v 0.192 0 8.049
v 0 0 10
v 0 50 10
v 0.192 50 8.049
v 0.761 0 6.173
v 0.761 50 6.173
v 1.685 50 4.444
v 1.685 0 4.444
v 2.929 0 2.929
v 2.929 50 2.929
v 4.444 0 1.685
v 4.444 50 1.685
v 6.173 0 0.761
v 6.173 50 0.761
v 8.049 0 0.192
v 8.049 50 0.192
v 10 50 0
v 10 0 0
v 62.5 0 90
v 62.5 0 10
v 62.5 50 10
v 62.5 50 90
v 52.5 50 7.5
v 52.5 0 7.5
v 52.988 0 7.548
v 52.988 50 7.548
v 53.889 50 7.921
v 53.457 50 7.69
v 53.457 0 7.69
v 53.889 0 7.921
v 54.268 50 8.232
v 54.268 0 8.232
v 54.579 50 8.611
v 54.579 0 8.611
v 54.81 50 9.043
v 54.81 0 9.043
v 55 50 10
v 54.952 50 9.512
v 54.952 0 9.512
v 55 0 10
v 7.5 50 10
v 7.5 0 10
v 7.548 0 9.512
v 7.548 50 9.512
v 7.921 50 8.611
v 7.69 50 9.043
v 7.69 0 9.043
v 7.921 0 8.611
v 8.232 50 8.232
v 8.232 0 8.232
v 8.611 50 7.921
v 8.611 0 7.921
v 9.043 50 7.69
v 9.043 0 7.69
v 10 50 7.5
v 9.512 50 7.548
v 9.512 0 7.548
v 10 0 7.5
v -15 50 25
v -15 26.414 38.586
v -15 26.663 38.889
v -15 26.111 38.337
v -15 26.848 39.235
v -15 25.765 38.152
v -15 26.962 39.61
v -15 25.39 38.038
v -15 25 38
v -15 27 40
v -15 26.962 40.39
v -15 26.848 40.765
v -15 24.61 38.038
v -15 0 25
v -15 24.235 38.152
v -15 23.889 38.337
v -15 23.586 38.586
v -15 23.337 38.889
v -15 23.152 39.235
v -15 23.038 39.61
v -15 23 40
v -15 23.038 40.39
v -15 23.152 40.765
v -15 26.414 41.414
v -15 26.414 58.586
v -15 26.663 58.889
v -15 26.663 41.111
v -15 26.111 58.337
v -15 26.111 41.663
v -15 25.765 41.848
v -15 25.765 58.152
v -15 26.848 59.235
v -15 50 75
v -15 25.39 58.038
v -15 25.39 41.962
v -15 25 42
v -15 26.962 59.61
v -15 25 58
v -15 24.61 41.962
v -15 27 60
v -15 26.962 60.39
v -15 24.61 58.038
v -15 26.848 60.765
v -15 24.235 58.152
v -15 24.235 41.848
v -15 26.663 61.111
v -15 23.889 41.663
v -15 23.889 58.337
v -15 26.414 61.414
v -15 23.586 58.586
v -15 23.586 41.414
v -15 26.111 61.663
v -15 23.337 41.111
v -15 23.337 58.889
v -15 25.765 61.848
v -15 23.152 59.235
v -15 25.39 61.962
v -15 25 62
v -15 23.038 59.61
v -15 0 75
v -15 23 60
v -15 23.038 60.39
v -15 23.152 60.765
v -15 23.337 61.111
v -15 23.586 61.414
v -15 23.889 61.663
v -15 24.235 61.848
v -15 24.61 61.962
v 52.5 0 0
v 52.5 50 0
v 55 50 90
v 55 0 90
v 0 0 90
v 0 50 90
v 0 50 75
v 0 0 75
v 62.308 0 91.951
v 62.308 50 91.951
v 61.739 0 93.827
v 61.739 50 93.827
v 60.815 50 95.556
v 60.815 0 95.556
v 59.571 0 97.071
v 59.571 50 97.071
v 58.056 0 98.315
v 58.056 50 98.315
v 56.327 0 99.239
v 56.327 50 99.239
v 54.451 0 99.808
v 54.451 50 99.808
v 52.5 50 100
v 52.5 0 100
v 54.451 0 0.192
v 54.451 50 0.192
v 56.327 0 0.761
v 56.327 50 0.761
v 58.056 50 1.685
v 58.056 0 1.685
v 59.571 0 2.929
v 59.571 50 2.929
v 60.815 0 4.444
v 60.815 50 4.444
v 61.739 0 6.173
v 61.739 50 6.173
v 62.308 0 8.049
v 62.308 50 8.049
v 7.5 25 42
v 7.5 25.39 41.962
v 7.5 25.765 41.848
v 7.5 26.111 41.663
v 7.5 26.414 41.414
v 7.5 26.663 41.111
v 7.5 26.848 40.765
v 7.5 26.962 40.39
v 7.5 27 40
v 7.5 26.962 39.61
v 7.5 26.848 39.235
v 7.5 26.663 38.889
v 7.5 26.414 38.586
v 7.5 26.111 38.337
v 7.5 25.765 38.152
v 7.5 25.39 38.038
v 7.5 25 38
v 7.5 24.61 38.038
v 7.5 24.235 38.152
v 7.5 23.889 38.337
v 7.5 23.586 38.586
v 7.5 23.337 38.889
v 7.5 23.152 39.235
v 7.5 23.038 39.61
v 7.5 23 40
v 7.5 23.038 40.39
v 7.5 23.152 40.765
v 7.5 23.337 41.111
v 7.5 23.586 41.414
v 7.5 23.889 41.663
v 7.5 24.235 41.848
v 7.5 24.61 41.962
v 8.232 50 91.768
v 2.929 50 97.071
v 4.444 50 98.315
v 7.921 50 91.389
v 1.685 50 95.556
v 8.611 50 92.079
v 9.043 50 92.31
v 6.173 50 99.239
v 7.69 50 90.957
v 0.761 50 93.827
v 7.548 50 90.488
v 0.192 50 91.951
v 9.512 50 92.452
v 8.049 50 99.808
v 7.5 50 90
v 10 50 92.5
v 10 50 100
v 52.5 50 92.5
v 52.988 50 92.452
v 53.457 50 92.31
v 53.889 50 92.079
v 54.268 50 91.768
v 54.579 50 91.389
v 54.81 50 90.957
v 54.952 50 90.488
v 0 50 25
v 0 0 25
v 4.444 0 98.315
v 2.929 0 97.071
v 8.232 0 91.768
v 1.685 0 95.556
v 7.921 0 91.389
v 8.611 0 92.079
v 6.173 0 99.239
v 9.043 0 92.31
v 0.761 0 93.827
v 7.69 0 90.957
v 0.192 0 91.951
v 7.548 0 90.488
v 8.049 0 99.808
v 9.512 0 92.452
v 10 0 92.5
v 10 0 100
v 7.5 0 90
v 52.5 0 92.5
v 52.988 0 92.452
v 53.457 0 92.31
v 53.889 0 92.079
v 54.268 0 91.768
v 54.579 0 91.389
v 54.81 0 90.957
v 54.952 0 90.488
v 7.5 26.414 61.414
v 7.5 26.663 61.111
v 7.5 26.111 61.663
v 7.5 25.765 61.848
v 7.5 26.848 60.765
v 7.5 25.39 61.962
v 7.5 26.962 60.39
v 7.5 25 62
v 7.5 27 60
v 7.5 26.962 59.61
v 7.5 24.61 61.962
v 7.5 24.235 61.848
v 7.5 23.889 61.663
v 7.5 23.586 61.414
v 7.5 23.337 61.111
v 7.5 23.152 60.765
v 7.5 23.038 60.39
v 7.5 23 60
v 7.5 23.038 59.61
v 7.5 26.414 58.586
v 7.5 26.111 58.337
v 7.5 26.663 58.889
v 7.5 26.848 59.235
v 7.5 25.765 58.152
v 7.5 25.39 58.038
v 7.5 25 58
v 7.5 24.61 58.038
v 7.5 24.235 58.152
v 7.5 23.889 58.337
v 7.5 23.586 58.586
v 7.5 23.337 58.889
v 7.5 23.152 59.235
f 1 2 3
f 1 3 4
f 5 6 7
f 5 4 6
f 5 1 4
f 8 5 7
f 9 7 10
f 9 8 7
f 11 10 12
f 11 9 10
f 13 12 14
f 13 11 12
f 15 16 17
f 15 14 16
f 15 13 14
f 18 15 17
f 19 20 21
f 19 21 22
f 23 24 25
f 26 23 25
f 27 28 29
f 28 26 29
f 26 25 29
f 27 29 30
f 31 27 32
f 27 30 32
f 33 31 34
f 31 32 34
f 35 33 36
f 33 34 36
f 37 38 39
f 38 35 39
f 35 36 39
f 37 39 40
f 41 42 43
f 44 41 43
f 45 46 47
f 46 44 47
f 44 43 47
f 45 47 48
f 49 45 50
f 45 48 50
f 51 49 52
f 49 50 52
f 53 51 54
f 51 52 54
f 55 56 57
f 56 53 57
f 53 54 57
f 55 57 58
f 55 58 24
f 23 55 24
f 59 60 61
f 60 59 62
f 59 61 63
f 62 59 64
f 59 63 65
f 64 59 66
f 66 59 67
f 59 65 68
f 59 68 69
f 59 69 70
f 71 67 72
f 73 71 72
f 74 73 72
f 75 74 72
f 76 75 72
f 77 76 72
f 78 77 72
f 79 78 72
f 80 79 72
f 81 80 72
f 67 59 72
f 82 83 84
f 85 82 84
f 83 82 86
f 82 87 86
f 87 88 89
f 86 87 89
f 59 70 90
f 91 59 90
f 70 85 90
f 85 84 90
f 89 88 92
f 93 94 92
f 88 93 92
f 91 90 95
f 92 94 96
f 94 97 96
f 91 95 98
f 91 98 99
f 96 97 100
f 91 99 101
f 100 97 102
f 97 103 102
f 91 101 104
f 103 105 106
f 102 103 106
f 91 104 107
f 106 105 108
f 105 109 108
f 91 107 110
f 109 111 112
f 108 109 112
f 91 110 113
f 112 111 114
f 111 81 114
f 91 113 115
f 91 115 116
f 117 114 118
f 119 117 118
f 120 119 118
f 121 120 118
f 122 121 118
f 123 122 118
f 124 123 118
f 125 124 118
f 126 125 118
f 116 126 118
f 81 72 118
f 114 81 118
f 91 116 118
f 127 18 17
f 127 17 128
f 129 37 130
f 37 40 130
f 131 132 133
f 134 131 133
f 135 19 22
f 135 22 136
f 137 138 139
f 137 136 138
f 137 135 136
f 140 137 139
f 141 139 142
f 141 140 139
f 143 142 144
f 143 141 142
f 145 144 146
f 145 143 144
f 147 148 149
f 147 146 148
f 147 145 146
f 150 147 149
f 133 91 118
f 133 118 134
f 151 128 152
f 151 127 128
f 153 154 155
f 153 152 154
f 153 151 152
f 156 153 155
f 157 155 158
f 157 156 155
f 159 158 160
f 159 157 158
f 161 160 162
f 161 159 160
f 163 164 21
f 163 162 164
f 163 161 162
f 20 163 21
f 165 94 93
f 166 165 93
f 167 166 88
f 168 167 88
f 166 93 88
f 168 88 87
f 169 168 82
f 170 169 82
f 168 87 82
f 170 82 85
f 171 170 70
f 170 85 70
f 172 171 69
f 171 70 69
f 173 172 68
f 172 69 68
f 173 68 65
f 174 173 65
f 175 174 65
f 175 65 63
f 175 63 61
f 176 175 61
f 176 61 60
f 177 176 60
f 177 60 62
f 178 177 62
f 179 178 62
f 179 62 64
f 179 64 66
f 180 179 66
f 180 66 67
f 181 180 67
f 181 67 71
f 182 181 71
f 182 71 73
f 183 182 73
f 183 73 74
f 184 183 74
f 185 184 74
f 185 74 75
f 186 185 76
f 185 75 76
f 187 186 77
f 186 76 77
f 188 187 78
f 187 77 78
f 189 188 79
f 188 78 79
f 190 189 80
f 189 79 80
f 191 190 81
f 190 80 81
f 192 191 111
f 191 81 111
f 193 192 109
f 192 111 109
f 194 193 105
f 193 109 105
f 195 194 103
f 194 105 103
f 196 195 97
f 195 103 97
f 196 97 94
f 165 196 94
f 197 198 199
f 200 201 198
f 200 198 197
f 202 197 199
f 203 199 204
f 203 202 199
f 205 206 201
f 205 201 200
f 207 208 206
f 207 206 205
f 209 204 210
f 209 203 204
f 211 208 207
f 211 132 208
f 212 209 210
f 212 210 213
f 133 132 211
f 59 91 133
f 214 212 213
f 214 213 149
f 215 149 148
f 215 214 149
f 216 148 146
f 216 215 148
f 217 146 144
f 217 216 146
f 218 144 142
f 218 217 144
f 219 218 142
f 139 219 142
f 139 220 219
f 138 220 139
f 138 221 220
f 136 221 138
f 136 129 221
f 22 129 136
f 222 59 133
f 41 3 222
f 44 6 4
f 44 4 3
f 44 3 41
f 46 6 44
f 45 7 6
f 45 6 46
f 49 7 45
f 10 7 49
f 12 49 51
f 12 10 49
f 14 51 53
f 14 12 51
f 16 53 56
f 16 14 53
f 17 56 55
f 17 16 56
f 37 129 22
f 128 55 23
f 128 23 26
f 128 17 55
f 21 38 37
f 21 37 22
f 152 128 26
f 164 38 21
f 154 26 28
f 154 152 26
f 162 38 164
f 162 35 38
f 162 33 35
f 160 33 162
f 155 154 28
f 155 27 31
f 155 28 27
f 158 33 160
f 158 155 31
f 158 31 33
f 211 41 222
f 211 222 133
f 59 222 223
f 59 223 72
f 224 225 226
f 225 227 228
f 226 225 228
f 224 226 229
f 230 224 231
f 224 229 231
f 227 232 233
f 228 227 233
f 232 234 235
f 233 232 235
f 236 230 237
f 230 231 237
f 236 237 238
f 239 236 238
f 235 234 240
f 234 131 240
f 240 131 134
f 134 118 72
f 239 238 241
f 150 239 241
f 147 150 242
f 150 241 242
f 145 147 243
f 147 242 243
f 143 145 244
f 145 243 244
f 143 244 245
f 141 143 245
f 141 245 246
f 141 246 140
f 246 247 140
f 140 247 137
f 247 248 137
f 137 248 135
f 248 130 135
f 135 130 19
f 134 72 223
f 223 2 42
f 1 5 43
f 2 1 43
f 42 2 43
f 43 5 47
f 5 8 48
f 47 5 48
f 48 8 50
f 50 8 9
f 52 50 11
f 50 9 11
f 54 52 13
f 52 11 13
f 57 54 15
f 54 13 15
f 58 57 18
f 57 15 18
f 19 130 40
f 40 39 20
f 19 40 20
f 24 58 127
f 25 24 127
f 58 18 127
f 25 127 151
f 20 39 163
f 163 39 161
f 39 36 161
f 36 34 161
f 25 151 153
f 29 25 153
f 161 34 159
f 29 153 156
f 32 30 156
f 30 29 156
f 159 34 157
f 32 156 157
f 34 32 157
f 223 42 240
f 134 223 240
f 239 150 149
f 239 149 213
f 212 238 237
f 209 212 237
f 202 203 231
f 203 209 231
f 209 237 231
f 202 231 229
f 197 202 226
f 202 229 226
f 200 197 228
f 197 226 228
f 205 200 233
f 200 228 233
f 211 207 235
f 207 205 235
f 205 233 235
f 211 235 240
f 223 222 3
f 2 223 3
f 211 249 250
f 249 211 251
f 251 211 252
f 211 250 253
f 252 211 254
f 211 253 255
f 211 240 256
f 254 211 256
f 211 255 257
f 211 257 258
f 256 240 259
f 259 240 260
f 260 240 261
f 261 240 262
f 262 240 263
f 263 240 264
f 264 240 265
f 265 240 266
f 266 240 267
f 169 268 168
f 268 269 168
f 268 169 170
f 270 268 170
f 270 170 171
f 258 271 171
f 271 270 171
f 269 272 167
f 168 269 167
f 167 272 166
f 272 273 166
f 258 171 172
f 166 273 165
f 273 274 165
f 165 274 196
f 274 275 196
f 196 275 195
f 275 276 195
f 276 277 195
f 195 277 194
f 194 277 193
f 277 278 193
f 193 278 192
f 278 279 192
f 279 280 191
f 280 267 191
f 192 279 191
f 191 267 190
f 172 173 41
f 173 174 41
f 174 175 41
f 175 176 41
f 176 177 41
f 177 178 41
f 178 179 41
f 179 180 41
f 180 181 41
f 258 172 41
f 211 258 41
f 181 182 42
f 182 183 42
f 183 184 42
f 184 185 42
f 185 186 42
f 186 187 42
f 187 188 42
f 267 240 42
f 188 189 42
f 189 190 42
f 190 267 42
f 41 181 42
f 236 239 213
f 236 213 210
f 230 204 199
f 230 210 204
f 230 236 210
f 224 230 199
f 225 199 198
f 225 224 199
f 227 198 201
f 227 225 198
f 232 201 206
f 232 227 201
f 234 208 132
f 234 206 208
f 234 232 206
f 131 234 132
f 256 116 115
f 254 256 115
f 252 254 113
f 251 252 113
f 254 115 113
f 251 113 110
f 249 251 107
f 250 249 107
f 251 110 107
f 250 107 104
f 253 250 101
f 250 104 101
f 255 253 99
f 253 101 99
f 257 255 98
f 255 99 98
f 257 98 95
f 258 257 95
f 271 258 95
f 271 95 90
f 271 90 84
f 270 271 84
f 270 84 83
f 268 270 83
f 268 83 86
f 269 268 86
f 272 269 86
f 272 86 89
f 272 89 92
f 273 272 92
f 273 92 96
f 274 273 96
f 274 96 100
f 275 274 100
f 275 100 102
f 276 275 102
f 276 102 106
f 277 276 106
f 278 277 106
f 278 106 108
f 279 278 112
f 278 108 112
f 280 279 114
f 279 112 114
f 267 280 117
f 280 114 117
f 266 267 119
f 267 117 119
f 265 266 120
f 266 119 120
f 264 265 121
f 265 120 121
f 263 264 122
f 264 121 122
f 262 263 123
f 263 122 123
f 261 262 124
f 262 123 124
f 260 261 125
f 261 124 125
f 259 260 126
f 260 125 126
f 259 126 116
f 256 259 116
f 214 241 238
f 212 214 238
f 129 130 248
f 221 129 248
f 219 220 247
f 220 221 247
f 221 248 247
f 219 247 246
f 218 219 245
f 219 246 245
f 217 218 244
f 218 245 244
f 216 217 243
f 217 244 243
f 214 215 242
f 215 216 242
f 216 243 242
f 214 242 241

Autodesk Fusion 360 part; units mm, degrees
sketch "Sketch1" plane through (0, 0, 0) normal (1, 0, 0) x (0, 0, -1)
sketch "Sketch2" plane through (0, 0, 0) normal (0, 1, 0) x (1, 0, 0)
  line L0 (10, 0) -> (52.5, 0)
  line L1 (62.5, -10) -> (62.5, -90)
  line L2 (52.5, -100) -> (10, -100)
  line L3 (0, -25) -> (-15, -25)
  line L4 (-15, -25) -> (-15, -75)
  line L5 (-15, -75) -> (0, -75)
  arc A0 (10, 0) -> (0, -10) centre (10, -10) ccw
  arc A1 (62.5, -10) -> (52.5, 0) centre (52.5, -10) ccw
  arc A2 (52.5, -100) -> (62.5, -90) centre (52.5, -90) ccw
  arc A3 (0, -90) -> (10, -100) centre (10, -90) ccw
  arc A4 (10, -7.5) -> (7.5, -10) centre (10, -10) ccw
  line L6 (7.5, -90) -> (7.5, -10)
  arc A5 (7.5, -90) -> (10, -92.5) centre (10, -90) ccw
  line L7 (52.5, -92.5) -> (10, -92.5)
  arc A6 (52.5, -92.5) -> (55, -90) centre (52.5, -90) ccw
  line L8 (55, -10) -> (55, -90)
  arc A7 (55, -10) -> (52.5, -7.5) centre (52.5, -10) ccw
  line L9 (10, -7.5) -> (52.5, -7.5)
  line L10 (0, -90) -> (0, -75)
  line L11 (0, -25) -> (0, -10)
  point P0 (62.5, 0)
  point P1 (0, -100)
extrude "Extrude1" add sketch "Sketch2" along normal blind 50
sketch "Sketch3" plane through (-15, 0, 0) normal (-1, 0, 0) x (0, 0, 1)
  line L0 (25, 0) -> (75, 0)
  line L1 (75, 0) -> (75, 50)
  line L2 (75, 50) -> (25, 50)
  line L3 (25, 50) -> (25, 0)
  circle A0 centre (40, 25) radius 2
  circle A1 centre (60, 25) radius 2
  dimension "d7" = 4
  dimension "d8" = 4
extrude "Extrude2" cut sketch "Sketch3" against normal blind 45 contours A0 | A1
